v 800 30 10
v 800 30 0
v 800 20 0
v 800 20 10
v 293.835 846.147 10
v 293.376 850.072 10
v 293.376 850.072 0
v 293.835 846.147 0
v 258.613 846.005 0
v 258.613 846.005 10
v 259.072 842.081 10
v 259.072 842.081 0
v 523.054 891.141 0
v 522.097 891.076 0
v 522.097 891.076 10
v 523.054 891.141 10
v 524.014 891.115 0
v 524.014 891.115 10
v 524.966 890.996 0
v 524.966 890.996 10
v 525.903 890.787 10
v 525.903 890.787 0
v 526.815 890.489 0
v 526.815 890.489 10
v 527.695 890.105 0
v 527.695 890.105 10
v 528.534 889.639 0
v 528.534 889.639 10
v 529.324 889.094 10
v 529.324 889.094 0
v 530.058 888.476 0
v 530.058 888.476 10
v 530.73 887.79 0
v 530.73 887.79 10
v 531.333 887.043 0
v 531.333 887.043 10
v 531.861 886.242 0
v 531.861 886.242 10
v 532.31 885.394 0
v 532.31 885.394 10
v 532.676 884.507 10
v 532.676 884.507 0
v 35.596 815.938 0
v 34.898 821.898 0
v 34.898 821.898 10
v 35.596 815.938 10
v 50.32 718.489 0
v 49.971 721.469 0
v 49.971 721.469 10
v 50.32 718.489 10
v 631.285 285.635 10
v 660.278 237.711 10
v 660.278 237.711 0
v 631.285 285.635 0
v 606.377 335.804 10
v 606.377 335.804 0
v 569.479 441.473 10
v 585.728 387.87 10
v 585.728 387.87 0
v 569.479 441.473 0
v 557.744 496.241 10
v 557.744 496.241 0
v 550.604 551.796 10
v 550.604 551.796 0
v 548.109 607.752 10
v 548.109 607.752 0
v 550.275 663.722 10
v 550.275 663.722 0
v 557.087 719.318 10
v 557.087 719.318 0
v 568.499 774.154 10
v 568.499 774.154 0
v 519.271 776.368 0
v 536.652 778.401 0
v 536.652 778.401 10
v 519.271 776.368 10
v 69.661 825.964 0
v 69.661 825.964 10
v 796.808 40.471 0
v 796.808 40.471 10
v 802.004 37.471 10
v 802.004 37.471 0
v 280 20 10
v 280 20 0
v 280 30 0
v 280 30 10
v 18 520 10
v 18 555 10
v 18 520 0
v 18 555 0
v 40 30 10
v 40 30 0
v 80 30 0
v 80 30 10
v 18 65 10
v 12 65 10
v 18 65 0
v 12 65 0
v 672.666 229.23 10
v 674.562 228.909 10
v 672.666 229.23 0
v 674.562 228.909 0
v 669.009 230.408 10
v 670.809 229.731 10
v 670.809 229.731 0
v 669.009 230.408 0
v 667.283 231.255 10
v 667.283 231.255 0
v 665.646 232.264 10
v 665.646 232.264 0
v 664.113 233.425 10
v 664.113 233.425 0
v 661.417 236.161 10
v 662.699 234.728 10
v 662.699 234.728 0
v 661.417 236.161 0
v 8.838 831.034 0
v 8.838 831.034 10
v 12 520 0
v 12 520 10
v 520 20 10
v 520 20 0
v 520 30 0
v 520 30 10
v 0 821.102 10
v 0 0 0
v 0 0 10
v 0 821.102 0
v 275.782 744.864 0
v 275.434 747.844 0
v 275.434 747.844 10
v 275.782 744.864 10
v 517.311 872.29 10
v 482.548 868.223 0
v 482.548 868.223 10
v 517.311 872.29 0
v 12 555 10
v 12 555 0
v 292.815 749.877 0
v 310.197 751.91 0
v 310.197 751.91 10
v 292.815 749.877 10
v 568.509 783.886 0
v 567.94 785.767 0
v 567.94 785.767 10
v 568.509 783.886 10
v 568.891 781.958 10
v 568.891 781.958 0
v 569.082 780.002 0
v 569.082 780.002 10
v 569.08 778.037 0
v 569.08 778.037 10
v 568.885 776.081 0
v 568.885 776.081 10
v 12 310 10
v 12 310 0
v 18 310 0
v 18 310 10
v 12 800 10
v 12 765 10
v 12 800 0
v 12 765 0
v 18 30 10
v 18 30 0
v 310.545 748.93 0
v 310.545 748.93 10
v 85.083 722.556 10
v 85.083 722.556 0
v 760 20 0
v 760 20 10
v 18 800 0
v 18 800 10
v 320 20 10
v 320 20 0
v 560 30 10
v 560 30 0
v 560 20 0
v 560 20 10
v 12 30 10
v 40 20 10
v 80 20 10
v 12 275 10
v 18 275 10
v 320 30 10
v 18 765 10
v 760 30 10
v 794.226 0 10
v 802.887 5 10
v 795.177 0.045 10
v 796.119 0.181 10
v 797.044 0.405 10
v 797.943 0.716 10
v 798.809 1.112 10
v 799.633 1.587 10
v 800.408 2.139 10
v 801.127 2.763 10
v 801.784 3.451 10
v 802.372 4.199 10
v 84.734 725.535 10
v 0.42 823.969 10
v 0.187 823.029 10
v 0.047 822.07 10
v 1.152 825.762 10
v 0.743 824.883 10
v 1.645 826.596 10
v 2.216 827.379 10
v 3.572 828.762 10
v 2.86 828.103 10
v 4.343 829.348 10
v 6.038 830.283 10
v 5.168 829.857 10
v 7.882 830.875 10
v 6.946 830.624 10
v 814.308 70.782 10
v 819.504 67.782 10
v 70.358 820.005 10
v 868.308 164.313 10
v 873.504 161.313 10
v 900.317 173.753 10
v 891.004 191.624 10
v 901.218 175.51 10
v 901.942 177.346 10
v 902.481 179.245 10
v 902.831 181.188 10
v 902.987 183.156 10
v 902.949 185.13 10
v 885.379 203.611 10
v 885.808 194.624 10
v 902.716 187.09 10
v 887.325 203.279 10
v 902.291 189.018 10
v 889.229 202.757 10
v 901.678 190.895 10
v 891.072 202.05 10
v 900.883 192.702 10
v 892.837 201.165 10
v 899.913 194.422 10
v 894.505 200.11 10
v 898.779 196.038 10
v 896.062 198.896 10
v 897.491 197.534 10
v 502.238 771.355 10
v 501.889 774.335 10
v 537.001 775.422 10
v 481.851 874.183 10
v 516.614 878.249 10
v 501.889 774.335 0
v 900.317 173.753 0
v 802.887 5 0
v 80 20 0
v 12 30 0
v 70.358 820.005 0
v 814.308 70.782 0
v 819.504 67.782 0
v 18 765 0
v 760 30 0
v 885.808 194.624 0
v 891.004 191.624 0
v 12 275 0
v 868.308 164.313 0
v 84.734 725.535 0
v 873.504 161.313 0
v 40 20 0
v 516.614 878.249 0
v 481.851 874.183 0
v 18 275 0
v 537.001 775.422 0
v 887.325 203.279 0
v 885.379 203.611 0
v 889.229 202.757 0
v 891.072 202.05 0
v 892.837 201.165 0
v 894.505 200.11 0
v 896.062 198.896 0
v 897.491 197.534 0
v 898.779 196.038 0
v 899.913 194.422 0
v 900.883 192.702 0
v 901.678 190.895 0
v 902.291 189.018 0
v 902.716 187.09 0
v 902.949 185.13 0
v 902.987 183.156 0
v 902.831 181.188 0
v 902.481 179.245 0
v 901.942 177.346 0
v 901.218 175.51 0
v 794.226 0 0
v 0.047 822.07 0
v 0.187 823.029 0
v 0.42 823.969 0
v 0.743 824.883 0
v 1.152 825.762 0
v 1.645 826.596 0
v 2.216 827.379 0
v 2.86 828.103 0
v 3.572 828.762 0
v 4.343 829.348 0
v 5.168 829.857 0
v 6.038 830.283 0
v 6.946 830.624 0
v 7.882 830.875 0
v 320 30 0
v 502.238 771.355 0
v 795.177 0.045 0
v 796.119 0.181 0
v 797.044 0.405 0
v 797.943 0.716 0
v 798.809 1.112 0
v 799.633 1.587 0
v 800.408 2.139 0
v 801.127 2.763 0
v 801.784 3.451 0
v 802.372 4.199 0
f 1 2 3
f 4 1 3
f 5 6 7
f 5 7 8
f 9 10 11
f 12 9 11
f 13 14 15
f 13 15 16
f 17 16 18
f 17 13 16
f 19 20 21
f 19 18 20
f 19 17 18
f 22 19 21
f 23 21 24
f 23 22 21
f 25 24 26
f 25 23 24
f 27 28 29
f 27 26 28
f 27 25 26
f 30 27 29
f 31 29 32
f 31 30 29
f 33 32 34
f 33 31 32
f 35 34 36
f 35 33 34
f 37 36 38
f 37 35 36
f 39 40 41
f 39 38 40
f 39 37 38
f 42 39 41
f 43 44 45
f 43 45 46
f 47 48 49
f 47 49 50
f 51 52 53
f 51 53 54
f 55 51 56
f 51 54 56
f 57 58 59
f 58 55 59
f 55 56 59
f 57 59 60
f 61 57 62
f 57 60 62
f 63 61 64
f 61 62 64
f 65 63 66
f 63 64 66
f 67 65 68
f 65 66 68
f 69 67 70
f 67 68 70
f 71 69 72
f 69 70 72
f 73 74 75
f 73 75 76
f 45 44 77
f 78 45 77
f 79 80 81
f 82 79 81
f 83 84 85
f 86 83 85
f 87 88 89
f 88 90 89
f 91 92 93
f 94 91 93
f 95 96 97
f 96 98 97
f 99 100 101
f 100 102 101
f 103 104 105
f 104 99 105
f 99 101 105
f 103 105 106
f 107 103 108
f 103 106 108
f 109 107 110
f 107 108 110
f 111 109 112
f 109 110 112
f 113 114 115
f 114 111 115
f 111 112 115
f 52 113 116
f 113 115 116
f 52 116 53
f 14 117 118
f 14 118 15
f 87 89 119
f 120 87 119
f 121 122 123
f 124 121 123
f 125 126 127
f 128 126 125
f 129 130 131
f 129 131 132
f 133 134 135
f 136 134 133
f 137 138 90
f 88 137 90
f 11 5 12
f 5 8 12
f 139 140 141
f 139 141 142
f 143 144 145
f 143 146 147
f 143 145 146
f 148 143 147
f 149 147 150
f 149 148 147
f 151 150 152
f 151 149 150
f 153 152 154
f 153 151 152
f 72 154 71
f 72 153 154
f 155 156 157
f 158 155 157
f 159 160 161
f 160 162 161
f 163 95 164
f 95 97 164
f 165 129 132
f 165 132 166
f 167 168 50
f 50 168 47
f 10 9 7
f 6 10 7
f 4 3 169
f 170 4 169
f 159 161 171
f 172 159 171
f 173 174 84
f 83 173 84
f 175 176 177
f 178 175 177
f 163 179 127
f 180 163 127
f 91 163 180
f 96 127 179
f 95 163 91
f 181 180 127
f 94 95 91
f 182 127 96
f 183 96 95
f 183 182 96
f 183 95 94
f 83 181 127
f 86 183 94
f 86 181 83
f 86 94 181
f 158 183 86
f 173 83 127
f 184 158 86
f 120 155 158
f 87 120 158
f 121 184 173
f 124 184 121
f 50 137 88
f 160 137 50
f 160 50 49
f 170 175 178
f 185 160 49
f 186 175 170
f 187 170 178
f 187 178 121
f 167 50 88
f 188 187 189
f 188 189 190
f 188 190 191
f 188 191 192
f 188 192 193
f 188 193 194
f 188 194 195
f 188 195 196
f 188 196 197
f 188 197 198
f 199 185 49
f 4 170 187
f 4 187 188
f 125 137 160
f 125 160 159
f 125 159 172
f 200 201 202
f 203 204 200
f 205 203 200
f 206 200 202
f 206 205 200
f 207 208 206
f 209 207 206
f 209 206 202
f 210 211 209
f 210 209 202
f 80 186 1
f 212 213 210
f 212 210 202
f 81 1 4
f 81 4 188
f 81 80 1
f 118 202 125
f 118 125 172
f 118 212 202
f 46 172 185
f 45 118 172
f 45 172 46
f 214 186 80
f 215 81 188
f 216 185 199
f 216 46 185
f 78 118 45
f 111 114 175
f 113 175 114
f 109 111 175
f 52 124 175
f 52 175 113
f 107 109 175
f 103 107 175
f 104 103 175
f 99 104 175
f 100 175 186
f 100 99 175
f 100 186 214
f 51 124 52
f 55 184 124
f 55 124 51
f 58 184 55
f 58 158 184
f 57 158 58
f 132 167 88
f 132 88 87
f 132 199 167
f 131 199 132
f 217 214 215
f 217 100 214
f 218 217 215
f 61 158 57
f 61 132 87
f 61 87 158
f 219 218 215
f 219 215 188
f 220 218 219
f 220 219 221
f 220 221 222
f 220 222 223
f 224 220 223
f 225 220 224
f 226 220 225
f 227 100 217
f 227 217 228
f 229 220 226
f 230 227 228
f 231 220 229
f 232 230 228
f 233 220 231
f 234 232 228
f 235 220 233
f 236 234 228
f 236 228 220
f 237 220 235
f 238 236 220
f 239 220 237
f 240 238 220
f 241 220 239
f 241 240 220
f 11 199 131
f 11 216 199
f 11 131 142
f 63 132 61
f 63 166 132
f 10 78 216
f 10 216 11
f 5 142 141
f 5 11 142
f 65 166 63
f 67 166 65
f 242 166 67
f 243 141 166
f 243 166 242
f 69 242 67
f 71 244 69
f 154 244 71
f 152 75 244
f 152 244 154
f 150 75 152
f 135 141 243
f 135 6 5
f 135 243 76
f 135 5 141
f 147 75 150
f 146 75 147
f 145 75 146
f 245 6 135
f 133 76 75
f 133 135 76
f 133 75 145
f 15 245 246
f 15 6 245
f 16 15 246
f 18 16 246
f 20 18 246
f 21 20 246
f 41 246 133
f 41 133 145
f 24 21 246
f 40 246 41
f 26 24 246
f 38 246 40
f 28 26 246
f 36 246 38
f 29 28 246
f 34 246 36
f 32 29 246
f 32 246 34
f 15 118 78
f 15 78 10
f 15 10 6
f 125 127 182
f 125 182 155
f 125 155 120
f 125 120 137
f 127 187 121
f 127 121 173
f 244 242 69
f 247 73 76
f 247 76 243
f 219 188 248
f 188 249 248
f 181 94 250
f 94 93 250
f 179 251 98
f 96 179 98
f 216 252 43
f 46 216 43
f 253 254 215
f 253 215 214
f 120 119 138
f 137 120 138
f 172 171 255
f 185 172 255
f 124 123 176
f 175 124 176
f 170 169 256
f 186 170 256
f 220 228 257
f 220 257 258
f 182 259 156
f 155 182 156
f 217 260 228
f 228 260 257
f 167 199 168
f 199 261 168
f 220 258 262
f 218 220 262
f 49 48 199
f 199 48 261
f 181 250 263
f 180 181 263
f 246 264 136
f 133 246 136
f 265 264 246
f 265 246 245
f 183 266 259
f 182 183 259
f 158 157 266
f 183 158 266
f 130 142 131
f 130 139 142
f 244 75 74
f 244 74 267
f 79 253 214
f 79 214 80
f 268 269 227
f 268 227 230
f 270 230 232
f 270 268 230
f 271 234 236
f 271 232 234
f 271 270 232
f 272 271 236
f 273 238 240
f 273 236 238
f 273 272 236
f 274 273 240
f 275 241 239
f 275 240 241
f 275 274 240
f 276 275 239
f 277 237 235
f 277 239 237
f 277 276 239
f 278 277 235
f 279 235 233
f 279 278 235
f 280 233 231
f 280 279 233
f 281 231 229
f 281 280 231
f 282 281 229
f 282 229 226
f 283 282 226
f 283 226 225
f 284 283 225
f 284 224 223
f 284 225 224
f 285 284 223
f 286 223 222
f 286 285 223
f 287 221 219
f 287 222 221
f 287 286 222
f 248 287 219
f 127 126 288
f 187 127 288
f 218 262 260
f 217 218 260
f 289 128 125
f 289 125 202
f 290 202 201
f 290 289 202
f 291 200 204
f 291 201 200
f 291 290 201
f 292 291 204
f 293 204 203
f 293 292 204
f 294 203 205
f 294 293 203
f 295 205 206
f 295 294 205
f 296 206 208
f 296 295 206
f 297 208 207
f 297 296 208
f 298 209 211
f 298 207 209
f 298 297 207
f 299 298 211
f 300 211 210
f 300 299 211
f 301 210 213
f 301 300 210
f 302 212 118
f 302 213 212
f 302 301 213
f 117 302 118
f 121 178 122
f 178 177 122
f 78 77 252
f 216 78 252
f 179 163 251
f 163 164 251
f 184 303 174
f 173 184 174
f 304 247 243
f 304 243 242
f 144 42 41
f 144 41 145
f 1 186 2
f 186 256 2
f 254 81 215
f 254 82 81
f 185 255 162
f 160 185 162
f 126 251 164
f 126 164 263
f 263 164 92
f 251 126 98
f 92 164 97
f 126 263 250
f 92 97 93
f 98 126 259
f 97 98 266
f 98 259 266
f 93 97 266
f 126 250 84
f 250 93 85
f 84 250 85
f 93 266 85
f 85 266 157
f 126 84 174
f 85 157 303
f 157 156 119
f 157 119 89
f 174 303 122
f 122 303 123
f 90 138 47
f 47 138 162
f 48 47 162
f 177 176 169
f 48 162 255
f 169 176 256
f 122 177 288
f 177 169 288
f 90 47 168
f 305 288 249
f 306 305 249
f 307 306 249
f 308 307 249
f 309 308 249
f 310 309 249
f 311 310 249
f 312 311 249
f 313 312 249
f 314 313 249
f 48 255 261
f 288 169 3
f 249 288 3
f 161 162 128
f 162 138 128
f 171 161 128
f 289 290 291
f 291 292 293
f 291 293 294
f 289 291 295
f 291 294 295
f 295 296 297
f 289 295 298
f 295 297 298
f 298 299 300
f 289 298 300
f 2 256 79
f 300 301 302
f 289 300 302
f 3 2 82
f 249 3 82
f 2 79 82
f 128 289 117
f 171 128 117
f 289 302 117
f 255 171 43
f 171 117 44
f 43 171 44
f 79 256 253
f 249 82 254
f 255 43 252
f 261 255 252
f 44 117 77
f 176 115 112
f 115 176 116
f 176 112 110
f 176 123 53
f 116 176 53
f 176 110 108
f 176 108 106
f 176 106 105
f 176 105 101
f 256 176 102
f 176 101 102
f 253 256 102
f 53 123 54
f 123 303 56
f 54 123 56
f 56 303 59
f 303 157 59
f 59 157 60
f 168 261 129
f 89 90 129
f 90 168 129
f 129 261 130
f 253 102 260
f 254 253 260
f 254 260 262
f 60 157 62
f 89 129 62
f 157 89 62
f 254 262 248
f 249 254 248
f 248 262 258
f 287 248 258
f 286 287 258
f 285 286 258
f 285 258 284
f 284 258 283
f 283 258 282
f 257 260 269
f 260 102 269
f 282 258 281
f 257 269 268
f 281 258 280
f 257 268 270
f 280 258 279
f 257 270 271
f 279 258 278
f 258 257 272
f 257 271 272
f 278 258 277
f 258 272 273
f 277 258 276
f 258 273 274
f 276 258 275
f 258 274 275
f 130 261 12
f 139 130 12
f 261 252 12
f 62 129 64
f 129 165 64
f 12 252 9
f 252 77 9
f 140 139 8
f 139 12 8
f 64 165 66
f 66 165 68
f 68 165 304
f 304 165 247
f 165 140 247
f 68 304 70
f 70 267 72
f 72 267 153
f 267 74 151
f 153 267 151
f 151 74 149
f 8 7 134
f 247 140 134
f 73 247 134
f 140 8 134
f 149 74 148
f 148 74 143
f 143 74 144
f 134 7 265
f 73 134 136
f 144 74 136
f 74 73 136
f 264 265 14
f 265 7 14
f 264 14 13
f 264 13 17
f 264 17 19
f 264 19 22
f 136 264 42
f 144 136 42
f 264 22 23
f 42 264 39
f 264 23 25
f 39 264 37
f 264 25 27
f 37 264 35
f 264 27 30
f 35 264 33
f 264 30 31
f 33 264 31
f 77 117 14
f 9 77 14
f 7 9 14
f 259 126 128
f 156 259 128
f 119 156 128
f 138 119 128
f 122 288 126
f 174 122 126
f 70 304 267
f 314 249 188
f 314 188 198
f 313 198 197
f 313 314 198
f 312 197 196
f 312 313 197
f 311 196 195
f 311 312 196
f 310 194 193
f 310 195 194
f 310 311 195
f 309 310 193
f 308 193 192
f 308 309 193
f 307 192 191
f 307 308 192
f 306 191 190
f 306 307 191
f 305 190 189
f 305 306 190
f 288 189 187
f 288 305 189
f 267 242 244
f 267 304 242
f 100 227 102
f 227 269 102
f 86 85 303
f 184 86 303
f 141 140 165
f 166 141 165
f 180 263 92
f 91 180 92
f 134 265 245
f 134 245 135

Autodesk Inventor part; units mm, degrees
ref_plane "YZ Plane" through (0, 0, 0) normal (1, 0, 0) x (0, 1, 0)
ref_plane "XZ Plane" through (0, 0, 0) normal (0, 1, 0) x (-1, 0, 0)
ref_plane "XY Plane" through (0, 0, 0) normal (0, 0, 1) x (1, 0, 0)
sketch "Sketch1" plane through (0, 0, 0) normal (0, 0, 1) x (1, 0, 0)
  line L0 (0, 0) -> (794.2265, 0)
  line L1 (0, 0) -> (0, 821.1016)
  line L2 (8.8381, 831.0339) -> (522.0969, 891.0755)
  line L3 (802.8868, 5) -> (900.3166, 173.7534)
  line L4 (532.6762, 884.5066) -> (567.9402, 785.7674)
  arc A0 (532.6762, 884.5066) -> (522.0969, 891.0755) centre (523.2588, 881.1432) ccw
  arc A1 (8.8381, 831.0339) -> (0, 821.1016) centre (10, 821.1016) ccw
  arc A2 (794.2265, 0) -> (802.8868, 5) centre (794.2265, 10) ccw
  line L5 (265.4675, 861.0547) -> (267.2222, 846.0547) construction
  line L6 (14.3861, 816.4776) -> (535.2127, 877.4045) construction
  line L7 (20, 820.1548) -> (531.512, 879.9921) construction
  line L8 (531.512, 879.9921) -> (532.2091, 874.0327) construction
  line L9 (532.2091, 874.0327) -> (20.6971, 814.1954) construction
  line L10 (20.6971, 814.1954) -> (20, 820.1548) construction
  line L11 (34.8984, 821.8976) -> (35.5955, 815.9383)
  line L12 (69.6614, 825.9643) -> (70.3585, 820.0049)
  line L13 (481.8506, 874.1826) -> (482.5478, 868.2233)
  line L14 (516.6136, 878.2492) -> (517.3107, 872.2899)
  line L15 (34.8984, 821.8976) -> (69.6614, 825.9643)
  line L16 (70.3585, 820.0049) -> (35.5955, 815.9383)
  line L17 (516.6136, 878.2492) -> (481.8506, 874.1826)
  line L18 (482.5478, 868.2233) -> (517.3107, 872.2899)
  line L19 (20.3486, 817.1751) -> (531.8605, 877.0124) construction
  line L20 (275.756, 850.0734) -> (276.1046, 847.0938) construction
  line L21 (569.7285, 780.7603) -> (0, 714.1128) construction
  line L22 (49.9711, 721.4687) -> (50.3197, 718.489)
  line L23 (84.734, 725.5353) -> (85.0826, 722.5557)
  line L24 (501.8894, 774.3347) -> (502.238, 771.355)
  line L25 (536.6524, 778.4013) -> (537.001, 775.4216)
  line L26 (49.9711, 721.4687) -> (84.734, 725.5353)
  line L27 (85.0826, 722.5557) -> (50.3197, 718.489)
  line L28 (536.6524, 778.4013) -> (501.8894, 774.3347)
  line L29 (502.238, 771.355) -> (537.001, 775.4216)
  line L30 (20, 719.4729) -> (566.2749, 783.3768) construction
  line L31 (566.2749, 783.3768) -> (566.9721, 777.4174) construction
  line L32 (566.9721, 777.4174) -> (20.6971, 713.5135) construction
  line L33 (20.6971, 713.5135) -> (20, 719.4729) construction
  line L34 (15, 0) -> (15, 541.5516) construction
  line L35 (12, 800) -> (18, 800)
  line L36 (18, 800) -> (18, 765)
  line L37 (18, 765) -> (12, 765)
  line L38 (12, 765) -> (12, 800)
  line L39 (12, 555) -> (18, 555)
  line L40 (18, 555) -> (18, 520)
  line L41 (18, 520) -> (12, 520)
  line L42 (12, 520) -> (12, 555)
  line L43 (12, 310) -> (18, 310)
  line L44 (18, 310) -> (18, 275)
  line L45 (18, 275) -> (12, 275)
  line L46 (12, 275) -> (12, 310)
  line L47 (12, 65) -> (18, 65)
  line L48 (18, 65) -> (18, 30)
  line L49 (18, 30) -> (12, 30)
  line L50 (12, 30) -> (12, 65)
  line L51 (31.6599, 656.3688) -> (531.6599, 656.3688) construction
  line L52 (531.6599, 656.3688) -> (531.6599, 36.3688) construction
  line L53 (531.6599, 36.3688) -> (31.6599, 36.3688) construction
  line L54 (31.6599, 36.3688) -> (31.6599, 656.3688) construction
  line L55 (885.379, 203.6109) -> (674.5616, 228.909)
  arc A3 (568.4993, 774.1544) -> (660.278, 237.7109) centre (1221.1056, 609.7342) ccw
  line L56 (40, 30) -> (80, 30)
  line L57 (80, 30) -> (80, 20)
  line L58 (80, 20) -> (40, 20)
  line L59 (40, 20) -> (40, 30)
  line L60 (280, 30) -> (320, 30)
  line L61 (320, 30) -> (320, 20)
  line L62 (320, 20) -> (280, 20)
  line L63 (280, 20) -> (280, 30)
  line L64 (520, 30) -> (560, 30)
  line L65 (560, 30) -> (560, 20)
  line L66 (560, 20) -> (520, 20)
  line L67 (520, 20) -> (520, 30)
  line L68 (760, 30) -> (800, 30)
  line L69 (800, 30) -> (800, 20)
  line L70 (800, 20) -> (760, 20)
  line L71 (760, 20) -> (760, 30)
  arc A4 (900.3166, 173.7534) -> (885.379, 203.6109) centre (882.9961, 183.7534) ccw
  arc A5 (660.278, 237.7109) -> (674.5616, 228.909) centre (676.9445, 248.7665) ccw
  arc A6 (568.4993, 774.1544) -> (567.9402, 785.7674) centre (549.1054, 779.0406) ccw
  line L72 (52.2799, 823.9309) -> (52.6284, 820.9513) construction
  line L73 (258.6126, 846.0051) -> (259.0716, 842.0808)
  line L74 (293.3755, 850.0717) -> (293.8346, 846.1474)
  line L75 (258.6126, 846.0051) -> (293.3755, 850.0717)
  line L76 (293.8346, 846.1474) -> (259.0716, 842.0808)
  line L77 (275.994, 848.0384) -> (276.3426, 845.0587) construction
  line L78 (519.2709, 776.368) -> (519.4452, 774.8781)
  line L79 (310.1966, 751.9102) -> (310.5452, 748.9305)
  line L80 (275.4337, 747.8436) -> (275.7822, 744.8639)
  line L81 (310.1966, 751.9102) -> (275.4337, 747.8436)
  line L82 (275.7822, 744.8639) -> (310.5452, 748.9305)
  line L83 (292.8151, 749.8769) -> (292.9894, 748.3871)
  line L84 (796.8079, 40.4711) -> (802.0041, 37.4711)
  line L85 (802.0041, 37.4711) -> (819.5041, 67.782)
  line L86 (819.5041, 67.782) -> (814.3079, 70.782)
  line L87 (814.3079, 70.782) -> (796.8079, 40.4711)
  line L88 (873.5041, 161.3128) -> (868.3079, 164.3128)
  line L89 (868.3079, 164.3128) -> (885.8079, 194.6237)
  line L90 (885.8079, 194.6237) -> (891.0041, 191.6237)
  line L91 (891.0041, 191.6237) -> (873.5041, 161.3128)
  line L92 (840.6385, 70.388) -> (823.318, 80.388) construction
  line L93 (892.9961, 201.0739) -> (776.906, 0) construction
  line L94 (799.406, 38.9711) -> (888.406, 193.1237) construction
  line L95 (843.906, 116.0474) -> (847.4398, 114.0072) construction
  line L96 (797.981, 30.503) -> (792.7848, 33.503) construction
  line L97 (796.8079, 40.4711) -> (792.7848, 33.503) construction
  line L98 (801.8634, 37.2275) -> (797.981, 30.503) construction
  line L99 (819.5041, 67.782) -> (873.5041, 161.3128) construction
  line L100 (868.3079, 164.3128) -> (814.3079, 70.782) construction
  line L101 (885.8079, 194.6237) -> (890.2848, 202.3779) construction
  line L102 (891.0041, 191.6237) -> (895.481, 199.3779) construction
  line L103 (890.2848, 202.3779) -> (895.481, 199.3779) construction
  line L104 (569.0823, 778.0788) -> (665.4701, 230) construction
  line L105 (665.4701, 230) -> (546.1008, 230) construction
  line L106 (569.0823, 778.0788) -> (515.1258, 778.0788) construction
  line L107 (509.3451, 770.6761) -> (604.6809, 230) construction
  point P0 (800, 0)
  point P1 (0, 830)
  point P2 (530, 892)
  point P3 (570, 780)
  point P4 (915.4701, 200)
  point P5 (570, 780)
  point P6 (15, 65)
  point P7 (84.9083, 724.0455)
  point P8 (502.0637, 772.8448)
  point P9 (20.3486, 716.4932)
  point P10 (275.6079, 746.3538)
  dimension "d0" = 830
  dimension "d1" = 62
  dimension "d2" = 50
  dimension "d3" = 800
  dimension "d9" = 530
  dimension "d10" = 570
  dimension "d13" = 10
  dimension "d16" = 15
  dimension "d17" = 6
  dimension "d18" = 515
  dimension "d19" = 35
  dimension "d20" = 15
  dimension "d21" = 15
  dimension "d22" = 35
  dimension "d23" = 415
  dimension "d24" = 35
  dimension "d25" = 35
  dimension "d27" = 6
  dimension "d28" = 550
  dimension "d31" = 15
  dimension "d32" = 35
  dimension "d33" = 6
  dimension "d34" = 30
  dimension "d35" = 210
  dimension "d36" = 210
  dimension "d37" = 210
  dimension "d38" = 30
  dimension "d39" = 30
  dimension "d40" = 420
  dimension "d42" = 20
  dimension "d48" = 3
  dimension "d50" = 5
  dimension "d51" = 100
  dimension "d58" = 500
  dimension "d59" = 620
  dimension "d60" = 200
  dimension "d61" = 230
  dimension "d62" = 250
  dimension "d63" = 10
  dimension "d64" = 40
  dimension "d65" = 200
  dimension "d66" = 200
  dimension "d67" = 200
  dimension "d68" = 40
  dimension "d69" = 20
  dimension "d72" = 20
  dimension "d73" = 35
  dimension "d74" = 20
  dimension "d75" = 20
  dimension "d76" = 10
  dimension "d77" = 35
  dimension "d78" = 192
  dimension "d79" = 193
  dimension "d80" = 673
  dimension "d84" = 22
  dimension "d85" = 190
  dimension "d86" = 190
  dimension "d87" = 6
  dimension "d88" = 35
  dimension "d89" = 20
  dimension "d90" = 120
  dimension "d91" = 45
  dimension "d92" = 108
  dimension "d93" = 195
extrude "Extrusion6" add sketch "Sketch1" along normal blind 10
properties part number "ladoA" material "Wood (Oak)"
